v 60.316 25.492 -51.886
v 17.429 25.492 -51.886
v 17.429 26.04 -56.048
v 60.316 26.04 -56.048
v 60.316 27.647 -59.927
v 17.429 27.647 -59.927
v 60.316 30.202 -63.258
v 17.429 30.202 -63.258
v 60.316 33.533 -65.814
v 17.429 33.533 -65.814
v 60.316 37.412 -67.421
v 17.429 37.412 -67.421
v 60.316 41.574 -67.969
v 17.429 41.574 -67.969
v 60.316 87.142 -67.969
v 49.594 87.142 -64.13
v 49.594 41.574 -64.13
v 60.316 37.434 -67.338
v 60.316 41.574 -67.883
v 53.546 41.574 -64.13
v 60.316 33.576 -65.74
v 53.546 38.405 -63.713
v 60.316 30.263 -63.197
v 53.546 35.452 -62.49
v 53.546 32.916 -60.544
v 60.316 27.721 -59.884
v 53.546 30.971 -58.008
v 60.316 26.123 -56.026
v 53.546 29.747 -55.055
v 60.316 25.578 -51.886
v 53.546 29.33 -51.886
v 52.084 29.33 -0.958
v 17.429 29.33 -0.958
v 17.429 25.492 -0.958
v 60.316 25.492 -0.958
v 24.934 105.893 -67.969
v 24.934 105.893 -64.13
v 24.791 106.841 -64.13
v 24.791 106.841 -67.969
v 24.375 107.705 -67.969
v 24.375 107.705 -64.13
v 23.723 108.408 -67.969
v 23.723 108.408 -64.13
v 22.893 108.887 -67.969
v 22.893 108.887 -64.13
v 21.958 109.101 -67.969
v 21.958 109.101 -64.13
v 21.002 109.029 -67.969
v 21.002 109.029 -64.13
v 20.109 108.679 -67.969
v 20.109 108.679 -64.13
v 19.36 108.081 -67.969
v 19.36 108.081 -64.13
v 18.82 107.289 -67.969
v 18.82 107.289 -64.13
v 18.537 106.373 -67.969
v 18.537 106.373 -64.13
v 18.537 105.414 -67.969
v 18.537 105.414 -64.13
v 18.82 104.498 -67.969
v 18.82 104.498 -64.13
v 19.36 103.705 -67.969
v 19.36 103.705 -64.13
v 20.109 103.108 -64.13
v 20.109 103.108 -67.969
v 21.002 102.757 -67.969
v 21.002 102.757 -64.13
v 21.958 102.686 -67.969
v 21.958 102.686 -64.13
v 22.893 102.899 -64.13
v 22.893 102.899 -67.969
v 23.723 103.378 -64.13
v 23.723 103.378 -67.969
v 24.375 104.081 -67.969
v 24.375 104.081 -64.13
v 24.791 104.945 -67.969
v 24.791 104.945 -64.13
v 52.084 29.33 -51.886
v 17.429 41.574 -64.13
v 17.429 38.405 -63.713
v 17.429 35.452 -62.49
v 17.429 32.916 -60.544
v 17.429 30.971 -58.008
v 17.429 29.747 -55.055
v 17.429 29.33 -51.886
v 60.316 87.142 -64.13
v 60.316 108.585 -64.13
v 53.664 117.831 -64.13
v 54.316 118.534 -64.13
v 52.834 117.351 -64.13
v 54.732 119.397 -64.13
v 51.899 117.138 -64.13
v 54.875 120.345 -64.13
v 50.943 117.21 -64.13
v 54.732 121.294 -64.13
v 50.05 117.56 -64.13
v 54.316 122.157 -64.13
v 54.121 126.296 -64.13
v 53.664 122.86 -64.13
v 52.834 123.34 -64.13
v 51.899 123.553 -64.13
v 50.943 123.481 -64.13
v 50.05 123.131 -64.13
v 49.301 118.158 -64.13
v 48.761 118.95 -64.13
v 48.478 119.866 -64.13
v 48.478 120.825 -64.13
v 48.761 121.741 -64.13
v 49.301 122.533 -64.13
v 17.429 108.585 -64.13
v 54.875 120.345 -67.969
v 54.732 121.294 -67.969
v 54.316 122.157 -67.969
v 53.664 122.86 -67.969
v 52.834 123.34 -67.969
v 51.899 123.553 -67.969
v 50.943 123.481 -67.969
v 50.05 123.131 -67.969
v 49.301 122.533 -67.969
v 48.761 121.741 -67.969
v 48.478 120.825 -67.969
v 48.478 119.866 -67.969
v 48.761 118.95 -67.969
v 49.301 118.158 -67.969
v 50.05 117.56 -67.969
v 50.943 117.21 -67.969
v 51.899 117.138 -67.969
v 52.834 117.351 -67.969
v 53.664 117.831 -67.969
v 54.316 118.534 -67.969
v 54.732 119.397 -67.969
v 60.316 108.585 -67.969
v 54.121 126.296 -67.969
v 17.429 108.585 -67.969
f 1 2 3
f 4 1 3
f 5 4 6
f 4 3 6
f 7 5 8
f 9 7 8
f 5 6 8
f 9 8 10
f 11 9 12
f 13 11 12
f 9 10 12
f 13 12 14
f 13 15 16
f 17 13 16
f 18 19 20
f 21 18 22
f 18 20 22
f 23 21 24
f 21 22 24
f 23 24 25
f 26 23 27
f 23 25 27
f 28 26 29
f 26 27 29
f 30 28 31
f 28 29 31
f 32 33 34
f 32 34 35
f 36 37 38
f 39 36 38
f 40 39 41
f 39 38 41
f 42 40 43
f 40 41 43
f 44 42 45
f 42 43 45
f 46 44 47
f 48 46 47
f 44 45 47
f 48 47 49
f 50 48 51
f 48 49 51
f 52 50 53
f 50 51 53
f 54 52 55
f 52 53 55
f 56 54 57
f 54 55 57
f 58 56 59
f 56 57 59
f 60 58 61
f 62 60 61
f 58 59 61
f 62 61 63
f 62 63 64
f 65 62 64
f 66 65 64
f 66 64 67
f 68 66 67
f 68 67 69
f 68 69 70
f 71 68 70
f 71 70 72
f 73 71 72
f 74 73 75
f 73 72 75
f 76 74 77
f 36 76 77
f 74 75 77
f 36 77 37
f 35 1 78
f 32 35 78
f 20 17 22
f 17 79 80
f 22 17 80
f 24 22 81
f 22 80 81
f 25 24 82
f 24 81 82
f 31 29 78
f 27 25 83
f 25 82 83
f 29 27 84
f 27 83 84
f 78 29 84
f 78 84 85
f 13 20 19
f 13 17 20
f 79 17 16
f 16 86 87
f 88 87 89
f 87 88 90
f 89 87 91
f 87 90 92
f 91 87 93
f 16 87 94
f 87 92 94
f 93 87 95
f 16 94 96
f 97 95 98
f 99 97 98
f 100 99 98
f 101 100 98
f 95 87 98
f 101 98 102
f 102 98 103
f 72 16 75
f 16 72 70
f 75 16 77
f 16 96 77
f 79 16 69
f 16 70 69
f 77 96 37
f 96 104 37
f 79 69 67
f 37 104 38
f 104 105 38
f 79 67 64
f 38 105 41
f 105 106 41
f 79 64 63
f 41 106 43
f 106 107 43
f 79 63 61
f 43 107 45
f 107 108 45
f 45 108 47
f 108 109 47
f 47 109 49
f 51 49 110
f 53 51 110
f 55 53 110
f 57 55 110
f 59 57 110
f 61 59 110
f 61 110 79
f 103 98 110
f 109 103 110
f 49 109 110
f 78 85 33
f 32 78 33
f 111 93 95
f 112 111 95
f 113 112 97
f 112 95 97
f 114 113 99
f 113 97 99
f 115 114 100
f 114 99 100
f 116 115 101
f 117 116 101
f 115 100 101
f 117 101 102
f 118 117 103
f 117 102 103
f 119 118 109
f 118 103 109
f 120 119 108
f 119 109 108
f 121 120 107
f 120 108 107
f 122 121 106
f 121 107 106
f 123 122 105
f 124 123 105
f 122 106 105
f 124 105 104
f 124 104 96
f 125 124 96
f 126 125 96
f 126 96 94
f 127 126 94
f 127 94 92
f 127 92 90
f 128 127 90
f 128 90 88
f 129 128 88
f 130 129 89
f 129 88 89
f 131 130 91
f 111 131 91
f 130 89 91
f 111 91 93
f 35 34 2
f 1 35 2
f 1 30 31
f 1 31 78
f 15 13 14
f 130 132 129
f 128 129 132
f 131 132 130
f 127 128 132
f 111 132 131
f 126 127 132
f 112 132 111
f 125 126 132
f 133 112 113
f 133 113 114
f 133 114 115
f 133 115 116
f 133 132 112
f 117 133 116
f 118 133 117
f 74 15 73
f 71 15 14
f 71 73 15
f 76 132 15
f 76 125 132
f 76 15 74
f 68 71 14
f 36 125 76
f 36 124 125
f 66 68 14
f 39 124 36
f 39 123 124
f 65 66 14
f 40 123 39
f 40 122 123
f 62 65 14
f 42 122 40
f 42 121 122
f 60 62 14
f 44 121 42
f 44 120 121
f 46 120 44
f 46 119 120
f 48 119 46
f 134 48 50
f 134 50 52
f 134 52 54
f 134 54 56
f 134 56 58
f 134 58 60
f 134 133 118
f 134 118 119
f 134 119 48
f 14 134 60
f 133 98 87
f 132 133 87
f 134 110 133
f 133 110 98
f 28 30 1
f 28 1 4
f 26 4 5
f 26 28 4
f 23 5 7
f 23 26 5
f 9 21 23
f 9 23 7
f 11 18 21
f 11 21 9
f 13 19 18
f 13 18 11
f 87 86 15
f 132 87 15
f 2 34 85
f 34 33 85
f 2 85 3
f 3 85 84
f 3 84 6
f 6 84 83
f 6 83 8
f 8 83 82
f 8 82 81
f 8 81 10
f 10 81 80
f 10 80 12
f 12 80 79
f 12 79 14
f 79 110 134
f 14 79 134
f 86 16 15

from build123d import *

# Parameters (mm, degrees)
BOSS_EXTRUDE1_DEPTH = 80
BOSS_EXTRUDE2_DEPTH = 7.16
SKETCH3_R           = 6
CUT_EXTRUDE1_DEPTH  = 7.16
CUT_EXTRUDE6_DEPTH  = 95
CUT_EXTRUDE7_DEPTH  = 85
CHAMFER3_SIZE       = 7
CHAMFER3_SIZE2      = 12.628334287
SCALE1_SCALE        = 0.714781685
SCALE2_SCALE        = 0.5
SCALE3_SCALE        = 1.5


with BuildPart() as part:
    # Sketch1 → Boss-Extrude1 (new body)
    with BuildSketch(Plane(origin=(0, 0, 0), x_dir=(0, 0, -1), z_dir=(1, 0, 0))):
        with BuildLine():
            Line((-43.05875576, 0), (51.94124424, 0))
            ThreePointArc((51.94124424, 0), (73.154447675, 8.786796564), (81.94124424, 30))
            Line((81.94124424, 30), (81.94124424, 155))
            Line((81.94124424, 155), (74.78124424, 155))
            Line((74.78124424, 155), (74.78124424, 30))
            ThreePointArc((74.78124424, 30), (68.091563122, 13.849681118), (51.94124424, 7.16))
            Line((51.94124424, 7.16), (-43.05875576, 7.16))
            Line((-43.05875576, 7.16), (-43.05875576, 0))
        make_face()
    extrude(amount=BOSS_EXTRUDE1_DEPTH)

    # Sketch2 → Boss-Extrude2 (add)
    with BuildSketch(Plane.XY.offset(-74.78124424)):
        Polygon((0, 155), (68.44375, 188.037147061), (80, 155), align=None)
    extrude(amount=-BOSS_EXTRUDE2_DEPTH)

    # Sketch3 → Cut-Extrude1 (cut)
    with BuildSketch(Plane.XY.offset(-74.78124424)):
        with Locations((63.851173507, 176.937147061)):
            Circle(SKETCH3_R)
        with Locations((8, 149.978316888)):
            Circle(SKETCH3_R)
    extrude(amount=-CUT_EXTRUDE1_DEPTH, mode=Mode.SUBTRACT)

    # Sketch6 → Cut-Extrude6 (cut)
    with BuildSketch(Plane.XY.offset(43.05875576)):
        Polygon((80, 0), (64.645330449, 7.16), (80, 7.16), align=None)
    extrude(amount=-CUT_EXTRUDE6_DEPTH, mode=Mode.SUBTRACT)

    # Sketch10 → Cut-Extrude7 (cut)
    with BuildSketch(Plane(origin=(0, 115, 0), x_dir=(-1, 0, 0), z_dir=(0, -1, 0))):
        Polygon((-80, 81.94124424), (-60, 74.78124424), (-80, 74.78124424), align=None)
    extrude(amount=CUT_EXTRUDE7_DEPTH, mode=Mode.SUBTRACT)

    # Chamfer3
    chamfer3_edges = [part.edges().sort_by_distance(p)[0] for p in [
        (80, 13.849681118, -68.091563122),
    ]]
    chamfer3_side = [part.faces().sort_by_distance(p)[0] for p in [
        (80, 13.077563731, -68.863680509),
    ]]
    chamfer(chamfer3_edges, length=CHAMFER3_SIZE, length2=CHAMFER3_SIZE2, reference=chamfer3_side[0])


with BuildPart() as part_1:
    # Scale1: scaled about (37.569148968, 54.949559207, -51.822054035)
    add(part.part.scale(SCALE1_SCALE).moved(Location((10.715409355, 15.672620673, -14.780598919))))


with BuildPart() as part_2:
    # Scale2: scaled about (37.569148968, 54.949559207, -51.822054035)
    add(part_1.part.scale(SCALE2_SCALE).moved(Location((18.784574484, 27.474779604, -25.911027018))))


with BuildPart() as part_3:
    # Scale3: scaled about (37.569148968, 54.949559207, -51.822054035)
    add(part_2.part.scale(SCALE3_SCALE).moved(Location((-18.784574484, -27.474779604, 25.911027018))))


solid = part_3.part
